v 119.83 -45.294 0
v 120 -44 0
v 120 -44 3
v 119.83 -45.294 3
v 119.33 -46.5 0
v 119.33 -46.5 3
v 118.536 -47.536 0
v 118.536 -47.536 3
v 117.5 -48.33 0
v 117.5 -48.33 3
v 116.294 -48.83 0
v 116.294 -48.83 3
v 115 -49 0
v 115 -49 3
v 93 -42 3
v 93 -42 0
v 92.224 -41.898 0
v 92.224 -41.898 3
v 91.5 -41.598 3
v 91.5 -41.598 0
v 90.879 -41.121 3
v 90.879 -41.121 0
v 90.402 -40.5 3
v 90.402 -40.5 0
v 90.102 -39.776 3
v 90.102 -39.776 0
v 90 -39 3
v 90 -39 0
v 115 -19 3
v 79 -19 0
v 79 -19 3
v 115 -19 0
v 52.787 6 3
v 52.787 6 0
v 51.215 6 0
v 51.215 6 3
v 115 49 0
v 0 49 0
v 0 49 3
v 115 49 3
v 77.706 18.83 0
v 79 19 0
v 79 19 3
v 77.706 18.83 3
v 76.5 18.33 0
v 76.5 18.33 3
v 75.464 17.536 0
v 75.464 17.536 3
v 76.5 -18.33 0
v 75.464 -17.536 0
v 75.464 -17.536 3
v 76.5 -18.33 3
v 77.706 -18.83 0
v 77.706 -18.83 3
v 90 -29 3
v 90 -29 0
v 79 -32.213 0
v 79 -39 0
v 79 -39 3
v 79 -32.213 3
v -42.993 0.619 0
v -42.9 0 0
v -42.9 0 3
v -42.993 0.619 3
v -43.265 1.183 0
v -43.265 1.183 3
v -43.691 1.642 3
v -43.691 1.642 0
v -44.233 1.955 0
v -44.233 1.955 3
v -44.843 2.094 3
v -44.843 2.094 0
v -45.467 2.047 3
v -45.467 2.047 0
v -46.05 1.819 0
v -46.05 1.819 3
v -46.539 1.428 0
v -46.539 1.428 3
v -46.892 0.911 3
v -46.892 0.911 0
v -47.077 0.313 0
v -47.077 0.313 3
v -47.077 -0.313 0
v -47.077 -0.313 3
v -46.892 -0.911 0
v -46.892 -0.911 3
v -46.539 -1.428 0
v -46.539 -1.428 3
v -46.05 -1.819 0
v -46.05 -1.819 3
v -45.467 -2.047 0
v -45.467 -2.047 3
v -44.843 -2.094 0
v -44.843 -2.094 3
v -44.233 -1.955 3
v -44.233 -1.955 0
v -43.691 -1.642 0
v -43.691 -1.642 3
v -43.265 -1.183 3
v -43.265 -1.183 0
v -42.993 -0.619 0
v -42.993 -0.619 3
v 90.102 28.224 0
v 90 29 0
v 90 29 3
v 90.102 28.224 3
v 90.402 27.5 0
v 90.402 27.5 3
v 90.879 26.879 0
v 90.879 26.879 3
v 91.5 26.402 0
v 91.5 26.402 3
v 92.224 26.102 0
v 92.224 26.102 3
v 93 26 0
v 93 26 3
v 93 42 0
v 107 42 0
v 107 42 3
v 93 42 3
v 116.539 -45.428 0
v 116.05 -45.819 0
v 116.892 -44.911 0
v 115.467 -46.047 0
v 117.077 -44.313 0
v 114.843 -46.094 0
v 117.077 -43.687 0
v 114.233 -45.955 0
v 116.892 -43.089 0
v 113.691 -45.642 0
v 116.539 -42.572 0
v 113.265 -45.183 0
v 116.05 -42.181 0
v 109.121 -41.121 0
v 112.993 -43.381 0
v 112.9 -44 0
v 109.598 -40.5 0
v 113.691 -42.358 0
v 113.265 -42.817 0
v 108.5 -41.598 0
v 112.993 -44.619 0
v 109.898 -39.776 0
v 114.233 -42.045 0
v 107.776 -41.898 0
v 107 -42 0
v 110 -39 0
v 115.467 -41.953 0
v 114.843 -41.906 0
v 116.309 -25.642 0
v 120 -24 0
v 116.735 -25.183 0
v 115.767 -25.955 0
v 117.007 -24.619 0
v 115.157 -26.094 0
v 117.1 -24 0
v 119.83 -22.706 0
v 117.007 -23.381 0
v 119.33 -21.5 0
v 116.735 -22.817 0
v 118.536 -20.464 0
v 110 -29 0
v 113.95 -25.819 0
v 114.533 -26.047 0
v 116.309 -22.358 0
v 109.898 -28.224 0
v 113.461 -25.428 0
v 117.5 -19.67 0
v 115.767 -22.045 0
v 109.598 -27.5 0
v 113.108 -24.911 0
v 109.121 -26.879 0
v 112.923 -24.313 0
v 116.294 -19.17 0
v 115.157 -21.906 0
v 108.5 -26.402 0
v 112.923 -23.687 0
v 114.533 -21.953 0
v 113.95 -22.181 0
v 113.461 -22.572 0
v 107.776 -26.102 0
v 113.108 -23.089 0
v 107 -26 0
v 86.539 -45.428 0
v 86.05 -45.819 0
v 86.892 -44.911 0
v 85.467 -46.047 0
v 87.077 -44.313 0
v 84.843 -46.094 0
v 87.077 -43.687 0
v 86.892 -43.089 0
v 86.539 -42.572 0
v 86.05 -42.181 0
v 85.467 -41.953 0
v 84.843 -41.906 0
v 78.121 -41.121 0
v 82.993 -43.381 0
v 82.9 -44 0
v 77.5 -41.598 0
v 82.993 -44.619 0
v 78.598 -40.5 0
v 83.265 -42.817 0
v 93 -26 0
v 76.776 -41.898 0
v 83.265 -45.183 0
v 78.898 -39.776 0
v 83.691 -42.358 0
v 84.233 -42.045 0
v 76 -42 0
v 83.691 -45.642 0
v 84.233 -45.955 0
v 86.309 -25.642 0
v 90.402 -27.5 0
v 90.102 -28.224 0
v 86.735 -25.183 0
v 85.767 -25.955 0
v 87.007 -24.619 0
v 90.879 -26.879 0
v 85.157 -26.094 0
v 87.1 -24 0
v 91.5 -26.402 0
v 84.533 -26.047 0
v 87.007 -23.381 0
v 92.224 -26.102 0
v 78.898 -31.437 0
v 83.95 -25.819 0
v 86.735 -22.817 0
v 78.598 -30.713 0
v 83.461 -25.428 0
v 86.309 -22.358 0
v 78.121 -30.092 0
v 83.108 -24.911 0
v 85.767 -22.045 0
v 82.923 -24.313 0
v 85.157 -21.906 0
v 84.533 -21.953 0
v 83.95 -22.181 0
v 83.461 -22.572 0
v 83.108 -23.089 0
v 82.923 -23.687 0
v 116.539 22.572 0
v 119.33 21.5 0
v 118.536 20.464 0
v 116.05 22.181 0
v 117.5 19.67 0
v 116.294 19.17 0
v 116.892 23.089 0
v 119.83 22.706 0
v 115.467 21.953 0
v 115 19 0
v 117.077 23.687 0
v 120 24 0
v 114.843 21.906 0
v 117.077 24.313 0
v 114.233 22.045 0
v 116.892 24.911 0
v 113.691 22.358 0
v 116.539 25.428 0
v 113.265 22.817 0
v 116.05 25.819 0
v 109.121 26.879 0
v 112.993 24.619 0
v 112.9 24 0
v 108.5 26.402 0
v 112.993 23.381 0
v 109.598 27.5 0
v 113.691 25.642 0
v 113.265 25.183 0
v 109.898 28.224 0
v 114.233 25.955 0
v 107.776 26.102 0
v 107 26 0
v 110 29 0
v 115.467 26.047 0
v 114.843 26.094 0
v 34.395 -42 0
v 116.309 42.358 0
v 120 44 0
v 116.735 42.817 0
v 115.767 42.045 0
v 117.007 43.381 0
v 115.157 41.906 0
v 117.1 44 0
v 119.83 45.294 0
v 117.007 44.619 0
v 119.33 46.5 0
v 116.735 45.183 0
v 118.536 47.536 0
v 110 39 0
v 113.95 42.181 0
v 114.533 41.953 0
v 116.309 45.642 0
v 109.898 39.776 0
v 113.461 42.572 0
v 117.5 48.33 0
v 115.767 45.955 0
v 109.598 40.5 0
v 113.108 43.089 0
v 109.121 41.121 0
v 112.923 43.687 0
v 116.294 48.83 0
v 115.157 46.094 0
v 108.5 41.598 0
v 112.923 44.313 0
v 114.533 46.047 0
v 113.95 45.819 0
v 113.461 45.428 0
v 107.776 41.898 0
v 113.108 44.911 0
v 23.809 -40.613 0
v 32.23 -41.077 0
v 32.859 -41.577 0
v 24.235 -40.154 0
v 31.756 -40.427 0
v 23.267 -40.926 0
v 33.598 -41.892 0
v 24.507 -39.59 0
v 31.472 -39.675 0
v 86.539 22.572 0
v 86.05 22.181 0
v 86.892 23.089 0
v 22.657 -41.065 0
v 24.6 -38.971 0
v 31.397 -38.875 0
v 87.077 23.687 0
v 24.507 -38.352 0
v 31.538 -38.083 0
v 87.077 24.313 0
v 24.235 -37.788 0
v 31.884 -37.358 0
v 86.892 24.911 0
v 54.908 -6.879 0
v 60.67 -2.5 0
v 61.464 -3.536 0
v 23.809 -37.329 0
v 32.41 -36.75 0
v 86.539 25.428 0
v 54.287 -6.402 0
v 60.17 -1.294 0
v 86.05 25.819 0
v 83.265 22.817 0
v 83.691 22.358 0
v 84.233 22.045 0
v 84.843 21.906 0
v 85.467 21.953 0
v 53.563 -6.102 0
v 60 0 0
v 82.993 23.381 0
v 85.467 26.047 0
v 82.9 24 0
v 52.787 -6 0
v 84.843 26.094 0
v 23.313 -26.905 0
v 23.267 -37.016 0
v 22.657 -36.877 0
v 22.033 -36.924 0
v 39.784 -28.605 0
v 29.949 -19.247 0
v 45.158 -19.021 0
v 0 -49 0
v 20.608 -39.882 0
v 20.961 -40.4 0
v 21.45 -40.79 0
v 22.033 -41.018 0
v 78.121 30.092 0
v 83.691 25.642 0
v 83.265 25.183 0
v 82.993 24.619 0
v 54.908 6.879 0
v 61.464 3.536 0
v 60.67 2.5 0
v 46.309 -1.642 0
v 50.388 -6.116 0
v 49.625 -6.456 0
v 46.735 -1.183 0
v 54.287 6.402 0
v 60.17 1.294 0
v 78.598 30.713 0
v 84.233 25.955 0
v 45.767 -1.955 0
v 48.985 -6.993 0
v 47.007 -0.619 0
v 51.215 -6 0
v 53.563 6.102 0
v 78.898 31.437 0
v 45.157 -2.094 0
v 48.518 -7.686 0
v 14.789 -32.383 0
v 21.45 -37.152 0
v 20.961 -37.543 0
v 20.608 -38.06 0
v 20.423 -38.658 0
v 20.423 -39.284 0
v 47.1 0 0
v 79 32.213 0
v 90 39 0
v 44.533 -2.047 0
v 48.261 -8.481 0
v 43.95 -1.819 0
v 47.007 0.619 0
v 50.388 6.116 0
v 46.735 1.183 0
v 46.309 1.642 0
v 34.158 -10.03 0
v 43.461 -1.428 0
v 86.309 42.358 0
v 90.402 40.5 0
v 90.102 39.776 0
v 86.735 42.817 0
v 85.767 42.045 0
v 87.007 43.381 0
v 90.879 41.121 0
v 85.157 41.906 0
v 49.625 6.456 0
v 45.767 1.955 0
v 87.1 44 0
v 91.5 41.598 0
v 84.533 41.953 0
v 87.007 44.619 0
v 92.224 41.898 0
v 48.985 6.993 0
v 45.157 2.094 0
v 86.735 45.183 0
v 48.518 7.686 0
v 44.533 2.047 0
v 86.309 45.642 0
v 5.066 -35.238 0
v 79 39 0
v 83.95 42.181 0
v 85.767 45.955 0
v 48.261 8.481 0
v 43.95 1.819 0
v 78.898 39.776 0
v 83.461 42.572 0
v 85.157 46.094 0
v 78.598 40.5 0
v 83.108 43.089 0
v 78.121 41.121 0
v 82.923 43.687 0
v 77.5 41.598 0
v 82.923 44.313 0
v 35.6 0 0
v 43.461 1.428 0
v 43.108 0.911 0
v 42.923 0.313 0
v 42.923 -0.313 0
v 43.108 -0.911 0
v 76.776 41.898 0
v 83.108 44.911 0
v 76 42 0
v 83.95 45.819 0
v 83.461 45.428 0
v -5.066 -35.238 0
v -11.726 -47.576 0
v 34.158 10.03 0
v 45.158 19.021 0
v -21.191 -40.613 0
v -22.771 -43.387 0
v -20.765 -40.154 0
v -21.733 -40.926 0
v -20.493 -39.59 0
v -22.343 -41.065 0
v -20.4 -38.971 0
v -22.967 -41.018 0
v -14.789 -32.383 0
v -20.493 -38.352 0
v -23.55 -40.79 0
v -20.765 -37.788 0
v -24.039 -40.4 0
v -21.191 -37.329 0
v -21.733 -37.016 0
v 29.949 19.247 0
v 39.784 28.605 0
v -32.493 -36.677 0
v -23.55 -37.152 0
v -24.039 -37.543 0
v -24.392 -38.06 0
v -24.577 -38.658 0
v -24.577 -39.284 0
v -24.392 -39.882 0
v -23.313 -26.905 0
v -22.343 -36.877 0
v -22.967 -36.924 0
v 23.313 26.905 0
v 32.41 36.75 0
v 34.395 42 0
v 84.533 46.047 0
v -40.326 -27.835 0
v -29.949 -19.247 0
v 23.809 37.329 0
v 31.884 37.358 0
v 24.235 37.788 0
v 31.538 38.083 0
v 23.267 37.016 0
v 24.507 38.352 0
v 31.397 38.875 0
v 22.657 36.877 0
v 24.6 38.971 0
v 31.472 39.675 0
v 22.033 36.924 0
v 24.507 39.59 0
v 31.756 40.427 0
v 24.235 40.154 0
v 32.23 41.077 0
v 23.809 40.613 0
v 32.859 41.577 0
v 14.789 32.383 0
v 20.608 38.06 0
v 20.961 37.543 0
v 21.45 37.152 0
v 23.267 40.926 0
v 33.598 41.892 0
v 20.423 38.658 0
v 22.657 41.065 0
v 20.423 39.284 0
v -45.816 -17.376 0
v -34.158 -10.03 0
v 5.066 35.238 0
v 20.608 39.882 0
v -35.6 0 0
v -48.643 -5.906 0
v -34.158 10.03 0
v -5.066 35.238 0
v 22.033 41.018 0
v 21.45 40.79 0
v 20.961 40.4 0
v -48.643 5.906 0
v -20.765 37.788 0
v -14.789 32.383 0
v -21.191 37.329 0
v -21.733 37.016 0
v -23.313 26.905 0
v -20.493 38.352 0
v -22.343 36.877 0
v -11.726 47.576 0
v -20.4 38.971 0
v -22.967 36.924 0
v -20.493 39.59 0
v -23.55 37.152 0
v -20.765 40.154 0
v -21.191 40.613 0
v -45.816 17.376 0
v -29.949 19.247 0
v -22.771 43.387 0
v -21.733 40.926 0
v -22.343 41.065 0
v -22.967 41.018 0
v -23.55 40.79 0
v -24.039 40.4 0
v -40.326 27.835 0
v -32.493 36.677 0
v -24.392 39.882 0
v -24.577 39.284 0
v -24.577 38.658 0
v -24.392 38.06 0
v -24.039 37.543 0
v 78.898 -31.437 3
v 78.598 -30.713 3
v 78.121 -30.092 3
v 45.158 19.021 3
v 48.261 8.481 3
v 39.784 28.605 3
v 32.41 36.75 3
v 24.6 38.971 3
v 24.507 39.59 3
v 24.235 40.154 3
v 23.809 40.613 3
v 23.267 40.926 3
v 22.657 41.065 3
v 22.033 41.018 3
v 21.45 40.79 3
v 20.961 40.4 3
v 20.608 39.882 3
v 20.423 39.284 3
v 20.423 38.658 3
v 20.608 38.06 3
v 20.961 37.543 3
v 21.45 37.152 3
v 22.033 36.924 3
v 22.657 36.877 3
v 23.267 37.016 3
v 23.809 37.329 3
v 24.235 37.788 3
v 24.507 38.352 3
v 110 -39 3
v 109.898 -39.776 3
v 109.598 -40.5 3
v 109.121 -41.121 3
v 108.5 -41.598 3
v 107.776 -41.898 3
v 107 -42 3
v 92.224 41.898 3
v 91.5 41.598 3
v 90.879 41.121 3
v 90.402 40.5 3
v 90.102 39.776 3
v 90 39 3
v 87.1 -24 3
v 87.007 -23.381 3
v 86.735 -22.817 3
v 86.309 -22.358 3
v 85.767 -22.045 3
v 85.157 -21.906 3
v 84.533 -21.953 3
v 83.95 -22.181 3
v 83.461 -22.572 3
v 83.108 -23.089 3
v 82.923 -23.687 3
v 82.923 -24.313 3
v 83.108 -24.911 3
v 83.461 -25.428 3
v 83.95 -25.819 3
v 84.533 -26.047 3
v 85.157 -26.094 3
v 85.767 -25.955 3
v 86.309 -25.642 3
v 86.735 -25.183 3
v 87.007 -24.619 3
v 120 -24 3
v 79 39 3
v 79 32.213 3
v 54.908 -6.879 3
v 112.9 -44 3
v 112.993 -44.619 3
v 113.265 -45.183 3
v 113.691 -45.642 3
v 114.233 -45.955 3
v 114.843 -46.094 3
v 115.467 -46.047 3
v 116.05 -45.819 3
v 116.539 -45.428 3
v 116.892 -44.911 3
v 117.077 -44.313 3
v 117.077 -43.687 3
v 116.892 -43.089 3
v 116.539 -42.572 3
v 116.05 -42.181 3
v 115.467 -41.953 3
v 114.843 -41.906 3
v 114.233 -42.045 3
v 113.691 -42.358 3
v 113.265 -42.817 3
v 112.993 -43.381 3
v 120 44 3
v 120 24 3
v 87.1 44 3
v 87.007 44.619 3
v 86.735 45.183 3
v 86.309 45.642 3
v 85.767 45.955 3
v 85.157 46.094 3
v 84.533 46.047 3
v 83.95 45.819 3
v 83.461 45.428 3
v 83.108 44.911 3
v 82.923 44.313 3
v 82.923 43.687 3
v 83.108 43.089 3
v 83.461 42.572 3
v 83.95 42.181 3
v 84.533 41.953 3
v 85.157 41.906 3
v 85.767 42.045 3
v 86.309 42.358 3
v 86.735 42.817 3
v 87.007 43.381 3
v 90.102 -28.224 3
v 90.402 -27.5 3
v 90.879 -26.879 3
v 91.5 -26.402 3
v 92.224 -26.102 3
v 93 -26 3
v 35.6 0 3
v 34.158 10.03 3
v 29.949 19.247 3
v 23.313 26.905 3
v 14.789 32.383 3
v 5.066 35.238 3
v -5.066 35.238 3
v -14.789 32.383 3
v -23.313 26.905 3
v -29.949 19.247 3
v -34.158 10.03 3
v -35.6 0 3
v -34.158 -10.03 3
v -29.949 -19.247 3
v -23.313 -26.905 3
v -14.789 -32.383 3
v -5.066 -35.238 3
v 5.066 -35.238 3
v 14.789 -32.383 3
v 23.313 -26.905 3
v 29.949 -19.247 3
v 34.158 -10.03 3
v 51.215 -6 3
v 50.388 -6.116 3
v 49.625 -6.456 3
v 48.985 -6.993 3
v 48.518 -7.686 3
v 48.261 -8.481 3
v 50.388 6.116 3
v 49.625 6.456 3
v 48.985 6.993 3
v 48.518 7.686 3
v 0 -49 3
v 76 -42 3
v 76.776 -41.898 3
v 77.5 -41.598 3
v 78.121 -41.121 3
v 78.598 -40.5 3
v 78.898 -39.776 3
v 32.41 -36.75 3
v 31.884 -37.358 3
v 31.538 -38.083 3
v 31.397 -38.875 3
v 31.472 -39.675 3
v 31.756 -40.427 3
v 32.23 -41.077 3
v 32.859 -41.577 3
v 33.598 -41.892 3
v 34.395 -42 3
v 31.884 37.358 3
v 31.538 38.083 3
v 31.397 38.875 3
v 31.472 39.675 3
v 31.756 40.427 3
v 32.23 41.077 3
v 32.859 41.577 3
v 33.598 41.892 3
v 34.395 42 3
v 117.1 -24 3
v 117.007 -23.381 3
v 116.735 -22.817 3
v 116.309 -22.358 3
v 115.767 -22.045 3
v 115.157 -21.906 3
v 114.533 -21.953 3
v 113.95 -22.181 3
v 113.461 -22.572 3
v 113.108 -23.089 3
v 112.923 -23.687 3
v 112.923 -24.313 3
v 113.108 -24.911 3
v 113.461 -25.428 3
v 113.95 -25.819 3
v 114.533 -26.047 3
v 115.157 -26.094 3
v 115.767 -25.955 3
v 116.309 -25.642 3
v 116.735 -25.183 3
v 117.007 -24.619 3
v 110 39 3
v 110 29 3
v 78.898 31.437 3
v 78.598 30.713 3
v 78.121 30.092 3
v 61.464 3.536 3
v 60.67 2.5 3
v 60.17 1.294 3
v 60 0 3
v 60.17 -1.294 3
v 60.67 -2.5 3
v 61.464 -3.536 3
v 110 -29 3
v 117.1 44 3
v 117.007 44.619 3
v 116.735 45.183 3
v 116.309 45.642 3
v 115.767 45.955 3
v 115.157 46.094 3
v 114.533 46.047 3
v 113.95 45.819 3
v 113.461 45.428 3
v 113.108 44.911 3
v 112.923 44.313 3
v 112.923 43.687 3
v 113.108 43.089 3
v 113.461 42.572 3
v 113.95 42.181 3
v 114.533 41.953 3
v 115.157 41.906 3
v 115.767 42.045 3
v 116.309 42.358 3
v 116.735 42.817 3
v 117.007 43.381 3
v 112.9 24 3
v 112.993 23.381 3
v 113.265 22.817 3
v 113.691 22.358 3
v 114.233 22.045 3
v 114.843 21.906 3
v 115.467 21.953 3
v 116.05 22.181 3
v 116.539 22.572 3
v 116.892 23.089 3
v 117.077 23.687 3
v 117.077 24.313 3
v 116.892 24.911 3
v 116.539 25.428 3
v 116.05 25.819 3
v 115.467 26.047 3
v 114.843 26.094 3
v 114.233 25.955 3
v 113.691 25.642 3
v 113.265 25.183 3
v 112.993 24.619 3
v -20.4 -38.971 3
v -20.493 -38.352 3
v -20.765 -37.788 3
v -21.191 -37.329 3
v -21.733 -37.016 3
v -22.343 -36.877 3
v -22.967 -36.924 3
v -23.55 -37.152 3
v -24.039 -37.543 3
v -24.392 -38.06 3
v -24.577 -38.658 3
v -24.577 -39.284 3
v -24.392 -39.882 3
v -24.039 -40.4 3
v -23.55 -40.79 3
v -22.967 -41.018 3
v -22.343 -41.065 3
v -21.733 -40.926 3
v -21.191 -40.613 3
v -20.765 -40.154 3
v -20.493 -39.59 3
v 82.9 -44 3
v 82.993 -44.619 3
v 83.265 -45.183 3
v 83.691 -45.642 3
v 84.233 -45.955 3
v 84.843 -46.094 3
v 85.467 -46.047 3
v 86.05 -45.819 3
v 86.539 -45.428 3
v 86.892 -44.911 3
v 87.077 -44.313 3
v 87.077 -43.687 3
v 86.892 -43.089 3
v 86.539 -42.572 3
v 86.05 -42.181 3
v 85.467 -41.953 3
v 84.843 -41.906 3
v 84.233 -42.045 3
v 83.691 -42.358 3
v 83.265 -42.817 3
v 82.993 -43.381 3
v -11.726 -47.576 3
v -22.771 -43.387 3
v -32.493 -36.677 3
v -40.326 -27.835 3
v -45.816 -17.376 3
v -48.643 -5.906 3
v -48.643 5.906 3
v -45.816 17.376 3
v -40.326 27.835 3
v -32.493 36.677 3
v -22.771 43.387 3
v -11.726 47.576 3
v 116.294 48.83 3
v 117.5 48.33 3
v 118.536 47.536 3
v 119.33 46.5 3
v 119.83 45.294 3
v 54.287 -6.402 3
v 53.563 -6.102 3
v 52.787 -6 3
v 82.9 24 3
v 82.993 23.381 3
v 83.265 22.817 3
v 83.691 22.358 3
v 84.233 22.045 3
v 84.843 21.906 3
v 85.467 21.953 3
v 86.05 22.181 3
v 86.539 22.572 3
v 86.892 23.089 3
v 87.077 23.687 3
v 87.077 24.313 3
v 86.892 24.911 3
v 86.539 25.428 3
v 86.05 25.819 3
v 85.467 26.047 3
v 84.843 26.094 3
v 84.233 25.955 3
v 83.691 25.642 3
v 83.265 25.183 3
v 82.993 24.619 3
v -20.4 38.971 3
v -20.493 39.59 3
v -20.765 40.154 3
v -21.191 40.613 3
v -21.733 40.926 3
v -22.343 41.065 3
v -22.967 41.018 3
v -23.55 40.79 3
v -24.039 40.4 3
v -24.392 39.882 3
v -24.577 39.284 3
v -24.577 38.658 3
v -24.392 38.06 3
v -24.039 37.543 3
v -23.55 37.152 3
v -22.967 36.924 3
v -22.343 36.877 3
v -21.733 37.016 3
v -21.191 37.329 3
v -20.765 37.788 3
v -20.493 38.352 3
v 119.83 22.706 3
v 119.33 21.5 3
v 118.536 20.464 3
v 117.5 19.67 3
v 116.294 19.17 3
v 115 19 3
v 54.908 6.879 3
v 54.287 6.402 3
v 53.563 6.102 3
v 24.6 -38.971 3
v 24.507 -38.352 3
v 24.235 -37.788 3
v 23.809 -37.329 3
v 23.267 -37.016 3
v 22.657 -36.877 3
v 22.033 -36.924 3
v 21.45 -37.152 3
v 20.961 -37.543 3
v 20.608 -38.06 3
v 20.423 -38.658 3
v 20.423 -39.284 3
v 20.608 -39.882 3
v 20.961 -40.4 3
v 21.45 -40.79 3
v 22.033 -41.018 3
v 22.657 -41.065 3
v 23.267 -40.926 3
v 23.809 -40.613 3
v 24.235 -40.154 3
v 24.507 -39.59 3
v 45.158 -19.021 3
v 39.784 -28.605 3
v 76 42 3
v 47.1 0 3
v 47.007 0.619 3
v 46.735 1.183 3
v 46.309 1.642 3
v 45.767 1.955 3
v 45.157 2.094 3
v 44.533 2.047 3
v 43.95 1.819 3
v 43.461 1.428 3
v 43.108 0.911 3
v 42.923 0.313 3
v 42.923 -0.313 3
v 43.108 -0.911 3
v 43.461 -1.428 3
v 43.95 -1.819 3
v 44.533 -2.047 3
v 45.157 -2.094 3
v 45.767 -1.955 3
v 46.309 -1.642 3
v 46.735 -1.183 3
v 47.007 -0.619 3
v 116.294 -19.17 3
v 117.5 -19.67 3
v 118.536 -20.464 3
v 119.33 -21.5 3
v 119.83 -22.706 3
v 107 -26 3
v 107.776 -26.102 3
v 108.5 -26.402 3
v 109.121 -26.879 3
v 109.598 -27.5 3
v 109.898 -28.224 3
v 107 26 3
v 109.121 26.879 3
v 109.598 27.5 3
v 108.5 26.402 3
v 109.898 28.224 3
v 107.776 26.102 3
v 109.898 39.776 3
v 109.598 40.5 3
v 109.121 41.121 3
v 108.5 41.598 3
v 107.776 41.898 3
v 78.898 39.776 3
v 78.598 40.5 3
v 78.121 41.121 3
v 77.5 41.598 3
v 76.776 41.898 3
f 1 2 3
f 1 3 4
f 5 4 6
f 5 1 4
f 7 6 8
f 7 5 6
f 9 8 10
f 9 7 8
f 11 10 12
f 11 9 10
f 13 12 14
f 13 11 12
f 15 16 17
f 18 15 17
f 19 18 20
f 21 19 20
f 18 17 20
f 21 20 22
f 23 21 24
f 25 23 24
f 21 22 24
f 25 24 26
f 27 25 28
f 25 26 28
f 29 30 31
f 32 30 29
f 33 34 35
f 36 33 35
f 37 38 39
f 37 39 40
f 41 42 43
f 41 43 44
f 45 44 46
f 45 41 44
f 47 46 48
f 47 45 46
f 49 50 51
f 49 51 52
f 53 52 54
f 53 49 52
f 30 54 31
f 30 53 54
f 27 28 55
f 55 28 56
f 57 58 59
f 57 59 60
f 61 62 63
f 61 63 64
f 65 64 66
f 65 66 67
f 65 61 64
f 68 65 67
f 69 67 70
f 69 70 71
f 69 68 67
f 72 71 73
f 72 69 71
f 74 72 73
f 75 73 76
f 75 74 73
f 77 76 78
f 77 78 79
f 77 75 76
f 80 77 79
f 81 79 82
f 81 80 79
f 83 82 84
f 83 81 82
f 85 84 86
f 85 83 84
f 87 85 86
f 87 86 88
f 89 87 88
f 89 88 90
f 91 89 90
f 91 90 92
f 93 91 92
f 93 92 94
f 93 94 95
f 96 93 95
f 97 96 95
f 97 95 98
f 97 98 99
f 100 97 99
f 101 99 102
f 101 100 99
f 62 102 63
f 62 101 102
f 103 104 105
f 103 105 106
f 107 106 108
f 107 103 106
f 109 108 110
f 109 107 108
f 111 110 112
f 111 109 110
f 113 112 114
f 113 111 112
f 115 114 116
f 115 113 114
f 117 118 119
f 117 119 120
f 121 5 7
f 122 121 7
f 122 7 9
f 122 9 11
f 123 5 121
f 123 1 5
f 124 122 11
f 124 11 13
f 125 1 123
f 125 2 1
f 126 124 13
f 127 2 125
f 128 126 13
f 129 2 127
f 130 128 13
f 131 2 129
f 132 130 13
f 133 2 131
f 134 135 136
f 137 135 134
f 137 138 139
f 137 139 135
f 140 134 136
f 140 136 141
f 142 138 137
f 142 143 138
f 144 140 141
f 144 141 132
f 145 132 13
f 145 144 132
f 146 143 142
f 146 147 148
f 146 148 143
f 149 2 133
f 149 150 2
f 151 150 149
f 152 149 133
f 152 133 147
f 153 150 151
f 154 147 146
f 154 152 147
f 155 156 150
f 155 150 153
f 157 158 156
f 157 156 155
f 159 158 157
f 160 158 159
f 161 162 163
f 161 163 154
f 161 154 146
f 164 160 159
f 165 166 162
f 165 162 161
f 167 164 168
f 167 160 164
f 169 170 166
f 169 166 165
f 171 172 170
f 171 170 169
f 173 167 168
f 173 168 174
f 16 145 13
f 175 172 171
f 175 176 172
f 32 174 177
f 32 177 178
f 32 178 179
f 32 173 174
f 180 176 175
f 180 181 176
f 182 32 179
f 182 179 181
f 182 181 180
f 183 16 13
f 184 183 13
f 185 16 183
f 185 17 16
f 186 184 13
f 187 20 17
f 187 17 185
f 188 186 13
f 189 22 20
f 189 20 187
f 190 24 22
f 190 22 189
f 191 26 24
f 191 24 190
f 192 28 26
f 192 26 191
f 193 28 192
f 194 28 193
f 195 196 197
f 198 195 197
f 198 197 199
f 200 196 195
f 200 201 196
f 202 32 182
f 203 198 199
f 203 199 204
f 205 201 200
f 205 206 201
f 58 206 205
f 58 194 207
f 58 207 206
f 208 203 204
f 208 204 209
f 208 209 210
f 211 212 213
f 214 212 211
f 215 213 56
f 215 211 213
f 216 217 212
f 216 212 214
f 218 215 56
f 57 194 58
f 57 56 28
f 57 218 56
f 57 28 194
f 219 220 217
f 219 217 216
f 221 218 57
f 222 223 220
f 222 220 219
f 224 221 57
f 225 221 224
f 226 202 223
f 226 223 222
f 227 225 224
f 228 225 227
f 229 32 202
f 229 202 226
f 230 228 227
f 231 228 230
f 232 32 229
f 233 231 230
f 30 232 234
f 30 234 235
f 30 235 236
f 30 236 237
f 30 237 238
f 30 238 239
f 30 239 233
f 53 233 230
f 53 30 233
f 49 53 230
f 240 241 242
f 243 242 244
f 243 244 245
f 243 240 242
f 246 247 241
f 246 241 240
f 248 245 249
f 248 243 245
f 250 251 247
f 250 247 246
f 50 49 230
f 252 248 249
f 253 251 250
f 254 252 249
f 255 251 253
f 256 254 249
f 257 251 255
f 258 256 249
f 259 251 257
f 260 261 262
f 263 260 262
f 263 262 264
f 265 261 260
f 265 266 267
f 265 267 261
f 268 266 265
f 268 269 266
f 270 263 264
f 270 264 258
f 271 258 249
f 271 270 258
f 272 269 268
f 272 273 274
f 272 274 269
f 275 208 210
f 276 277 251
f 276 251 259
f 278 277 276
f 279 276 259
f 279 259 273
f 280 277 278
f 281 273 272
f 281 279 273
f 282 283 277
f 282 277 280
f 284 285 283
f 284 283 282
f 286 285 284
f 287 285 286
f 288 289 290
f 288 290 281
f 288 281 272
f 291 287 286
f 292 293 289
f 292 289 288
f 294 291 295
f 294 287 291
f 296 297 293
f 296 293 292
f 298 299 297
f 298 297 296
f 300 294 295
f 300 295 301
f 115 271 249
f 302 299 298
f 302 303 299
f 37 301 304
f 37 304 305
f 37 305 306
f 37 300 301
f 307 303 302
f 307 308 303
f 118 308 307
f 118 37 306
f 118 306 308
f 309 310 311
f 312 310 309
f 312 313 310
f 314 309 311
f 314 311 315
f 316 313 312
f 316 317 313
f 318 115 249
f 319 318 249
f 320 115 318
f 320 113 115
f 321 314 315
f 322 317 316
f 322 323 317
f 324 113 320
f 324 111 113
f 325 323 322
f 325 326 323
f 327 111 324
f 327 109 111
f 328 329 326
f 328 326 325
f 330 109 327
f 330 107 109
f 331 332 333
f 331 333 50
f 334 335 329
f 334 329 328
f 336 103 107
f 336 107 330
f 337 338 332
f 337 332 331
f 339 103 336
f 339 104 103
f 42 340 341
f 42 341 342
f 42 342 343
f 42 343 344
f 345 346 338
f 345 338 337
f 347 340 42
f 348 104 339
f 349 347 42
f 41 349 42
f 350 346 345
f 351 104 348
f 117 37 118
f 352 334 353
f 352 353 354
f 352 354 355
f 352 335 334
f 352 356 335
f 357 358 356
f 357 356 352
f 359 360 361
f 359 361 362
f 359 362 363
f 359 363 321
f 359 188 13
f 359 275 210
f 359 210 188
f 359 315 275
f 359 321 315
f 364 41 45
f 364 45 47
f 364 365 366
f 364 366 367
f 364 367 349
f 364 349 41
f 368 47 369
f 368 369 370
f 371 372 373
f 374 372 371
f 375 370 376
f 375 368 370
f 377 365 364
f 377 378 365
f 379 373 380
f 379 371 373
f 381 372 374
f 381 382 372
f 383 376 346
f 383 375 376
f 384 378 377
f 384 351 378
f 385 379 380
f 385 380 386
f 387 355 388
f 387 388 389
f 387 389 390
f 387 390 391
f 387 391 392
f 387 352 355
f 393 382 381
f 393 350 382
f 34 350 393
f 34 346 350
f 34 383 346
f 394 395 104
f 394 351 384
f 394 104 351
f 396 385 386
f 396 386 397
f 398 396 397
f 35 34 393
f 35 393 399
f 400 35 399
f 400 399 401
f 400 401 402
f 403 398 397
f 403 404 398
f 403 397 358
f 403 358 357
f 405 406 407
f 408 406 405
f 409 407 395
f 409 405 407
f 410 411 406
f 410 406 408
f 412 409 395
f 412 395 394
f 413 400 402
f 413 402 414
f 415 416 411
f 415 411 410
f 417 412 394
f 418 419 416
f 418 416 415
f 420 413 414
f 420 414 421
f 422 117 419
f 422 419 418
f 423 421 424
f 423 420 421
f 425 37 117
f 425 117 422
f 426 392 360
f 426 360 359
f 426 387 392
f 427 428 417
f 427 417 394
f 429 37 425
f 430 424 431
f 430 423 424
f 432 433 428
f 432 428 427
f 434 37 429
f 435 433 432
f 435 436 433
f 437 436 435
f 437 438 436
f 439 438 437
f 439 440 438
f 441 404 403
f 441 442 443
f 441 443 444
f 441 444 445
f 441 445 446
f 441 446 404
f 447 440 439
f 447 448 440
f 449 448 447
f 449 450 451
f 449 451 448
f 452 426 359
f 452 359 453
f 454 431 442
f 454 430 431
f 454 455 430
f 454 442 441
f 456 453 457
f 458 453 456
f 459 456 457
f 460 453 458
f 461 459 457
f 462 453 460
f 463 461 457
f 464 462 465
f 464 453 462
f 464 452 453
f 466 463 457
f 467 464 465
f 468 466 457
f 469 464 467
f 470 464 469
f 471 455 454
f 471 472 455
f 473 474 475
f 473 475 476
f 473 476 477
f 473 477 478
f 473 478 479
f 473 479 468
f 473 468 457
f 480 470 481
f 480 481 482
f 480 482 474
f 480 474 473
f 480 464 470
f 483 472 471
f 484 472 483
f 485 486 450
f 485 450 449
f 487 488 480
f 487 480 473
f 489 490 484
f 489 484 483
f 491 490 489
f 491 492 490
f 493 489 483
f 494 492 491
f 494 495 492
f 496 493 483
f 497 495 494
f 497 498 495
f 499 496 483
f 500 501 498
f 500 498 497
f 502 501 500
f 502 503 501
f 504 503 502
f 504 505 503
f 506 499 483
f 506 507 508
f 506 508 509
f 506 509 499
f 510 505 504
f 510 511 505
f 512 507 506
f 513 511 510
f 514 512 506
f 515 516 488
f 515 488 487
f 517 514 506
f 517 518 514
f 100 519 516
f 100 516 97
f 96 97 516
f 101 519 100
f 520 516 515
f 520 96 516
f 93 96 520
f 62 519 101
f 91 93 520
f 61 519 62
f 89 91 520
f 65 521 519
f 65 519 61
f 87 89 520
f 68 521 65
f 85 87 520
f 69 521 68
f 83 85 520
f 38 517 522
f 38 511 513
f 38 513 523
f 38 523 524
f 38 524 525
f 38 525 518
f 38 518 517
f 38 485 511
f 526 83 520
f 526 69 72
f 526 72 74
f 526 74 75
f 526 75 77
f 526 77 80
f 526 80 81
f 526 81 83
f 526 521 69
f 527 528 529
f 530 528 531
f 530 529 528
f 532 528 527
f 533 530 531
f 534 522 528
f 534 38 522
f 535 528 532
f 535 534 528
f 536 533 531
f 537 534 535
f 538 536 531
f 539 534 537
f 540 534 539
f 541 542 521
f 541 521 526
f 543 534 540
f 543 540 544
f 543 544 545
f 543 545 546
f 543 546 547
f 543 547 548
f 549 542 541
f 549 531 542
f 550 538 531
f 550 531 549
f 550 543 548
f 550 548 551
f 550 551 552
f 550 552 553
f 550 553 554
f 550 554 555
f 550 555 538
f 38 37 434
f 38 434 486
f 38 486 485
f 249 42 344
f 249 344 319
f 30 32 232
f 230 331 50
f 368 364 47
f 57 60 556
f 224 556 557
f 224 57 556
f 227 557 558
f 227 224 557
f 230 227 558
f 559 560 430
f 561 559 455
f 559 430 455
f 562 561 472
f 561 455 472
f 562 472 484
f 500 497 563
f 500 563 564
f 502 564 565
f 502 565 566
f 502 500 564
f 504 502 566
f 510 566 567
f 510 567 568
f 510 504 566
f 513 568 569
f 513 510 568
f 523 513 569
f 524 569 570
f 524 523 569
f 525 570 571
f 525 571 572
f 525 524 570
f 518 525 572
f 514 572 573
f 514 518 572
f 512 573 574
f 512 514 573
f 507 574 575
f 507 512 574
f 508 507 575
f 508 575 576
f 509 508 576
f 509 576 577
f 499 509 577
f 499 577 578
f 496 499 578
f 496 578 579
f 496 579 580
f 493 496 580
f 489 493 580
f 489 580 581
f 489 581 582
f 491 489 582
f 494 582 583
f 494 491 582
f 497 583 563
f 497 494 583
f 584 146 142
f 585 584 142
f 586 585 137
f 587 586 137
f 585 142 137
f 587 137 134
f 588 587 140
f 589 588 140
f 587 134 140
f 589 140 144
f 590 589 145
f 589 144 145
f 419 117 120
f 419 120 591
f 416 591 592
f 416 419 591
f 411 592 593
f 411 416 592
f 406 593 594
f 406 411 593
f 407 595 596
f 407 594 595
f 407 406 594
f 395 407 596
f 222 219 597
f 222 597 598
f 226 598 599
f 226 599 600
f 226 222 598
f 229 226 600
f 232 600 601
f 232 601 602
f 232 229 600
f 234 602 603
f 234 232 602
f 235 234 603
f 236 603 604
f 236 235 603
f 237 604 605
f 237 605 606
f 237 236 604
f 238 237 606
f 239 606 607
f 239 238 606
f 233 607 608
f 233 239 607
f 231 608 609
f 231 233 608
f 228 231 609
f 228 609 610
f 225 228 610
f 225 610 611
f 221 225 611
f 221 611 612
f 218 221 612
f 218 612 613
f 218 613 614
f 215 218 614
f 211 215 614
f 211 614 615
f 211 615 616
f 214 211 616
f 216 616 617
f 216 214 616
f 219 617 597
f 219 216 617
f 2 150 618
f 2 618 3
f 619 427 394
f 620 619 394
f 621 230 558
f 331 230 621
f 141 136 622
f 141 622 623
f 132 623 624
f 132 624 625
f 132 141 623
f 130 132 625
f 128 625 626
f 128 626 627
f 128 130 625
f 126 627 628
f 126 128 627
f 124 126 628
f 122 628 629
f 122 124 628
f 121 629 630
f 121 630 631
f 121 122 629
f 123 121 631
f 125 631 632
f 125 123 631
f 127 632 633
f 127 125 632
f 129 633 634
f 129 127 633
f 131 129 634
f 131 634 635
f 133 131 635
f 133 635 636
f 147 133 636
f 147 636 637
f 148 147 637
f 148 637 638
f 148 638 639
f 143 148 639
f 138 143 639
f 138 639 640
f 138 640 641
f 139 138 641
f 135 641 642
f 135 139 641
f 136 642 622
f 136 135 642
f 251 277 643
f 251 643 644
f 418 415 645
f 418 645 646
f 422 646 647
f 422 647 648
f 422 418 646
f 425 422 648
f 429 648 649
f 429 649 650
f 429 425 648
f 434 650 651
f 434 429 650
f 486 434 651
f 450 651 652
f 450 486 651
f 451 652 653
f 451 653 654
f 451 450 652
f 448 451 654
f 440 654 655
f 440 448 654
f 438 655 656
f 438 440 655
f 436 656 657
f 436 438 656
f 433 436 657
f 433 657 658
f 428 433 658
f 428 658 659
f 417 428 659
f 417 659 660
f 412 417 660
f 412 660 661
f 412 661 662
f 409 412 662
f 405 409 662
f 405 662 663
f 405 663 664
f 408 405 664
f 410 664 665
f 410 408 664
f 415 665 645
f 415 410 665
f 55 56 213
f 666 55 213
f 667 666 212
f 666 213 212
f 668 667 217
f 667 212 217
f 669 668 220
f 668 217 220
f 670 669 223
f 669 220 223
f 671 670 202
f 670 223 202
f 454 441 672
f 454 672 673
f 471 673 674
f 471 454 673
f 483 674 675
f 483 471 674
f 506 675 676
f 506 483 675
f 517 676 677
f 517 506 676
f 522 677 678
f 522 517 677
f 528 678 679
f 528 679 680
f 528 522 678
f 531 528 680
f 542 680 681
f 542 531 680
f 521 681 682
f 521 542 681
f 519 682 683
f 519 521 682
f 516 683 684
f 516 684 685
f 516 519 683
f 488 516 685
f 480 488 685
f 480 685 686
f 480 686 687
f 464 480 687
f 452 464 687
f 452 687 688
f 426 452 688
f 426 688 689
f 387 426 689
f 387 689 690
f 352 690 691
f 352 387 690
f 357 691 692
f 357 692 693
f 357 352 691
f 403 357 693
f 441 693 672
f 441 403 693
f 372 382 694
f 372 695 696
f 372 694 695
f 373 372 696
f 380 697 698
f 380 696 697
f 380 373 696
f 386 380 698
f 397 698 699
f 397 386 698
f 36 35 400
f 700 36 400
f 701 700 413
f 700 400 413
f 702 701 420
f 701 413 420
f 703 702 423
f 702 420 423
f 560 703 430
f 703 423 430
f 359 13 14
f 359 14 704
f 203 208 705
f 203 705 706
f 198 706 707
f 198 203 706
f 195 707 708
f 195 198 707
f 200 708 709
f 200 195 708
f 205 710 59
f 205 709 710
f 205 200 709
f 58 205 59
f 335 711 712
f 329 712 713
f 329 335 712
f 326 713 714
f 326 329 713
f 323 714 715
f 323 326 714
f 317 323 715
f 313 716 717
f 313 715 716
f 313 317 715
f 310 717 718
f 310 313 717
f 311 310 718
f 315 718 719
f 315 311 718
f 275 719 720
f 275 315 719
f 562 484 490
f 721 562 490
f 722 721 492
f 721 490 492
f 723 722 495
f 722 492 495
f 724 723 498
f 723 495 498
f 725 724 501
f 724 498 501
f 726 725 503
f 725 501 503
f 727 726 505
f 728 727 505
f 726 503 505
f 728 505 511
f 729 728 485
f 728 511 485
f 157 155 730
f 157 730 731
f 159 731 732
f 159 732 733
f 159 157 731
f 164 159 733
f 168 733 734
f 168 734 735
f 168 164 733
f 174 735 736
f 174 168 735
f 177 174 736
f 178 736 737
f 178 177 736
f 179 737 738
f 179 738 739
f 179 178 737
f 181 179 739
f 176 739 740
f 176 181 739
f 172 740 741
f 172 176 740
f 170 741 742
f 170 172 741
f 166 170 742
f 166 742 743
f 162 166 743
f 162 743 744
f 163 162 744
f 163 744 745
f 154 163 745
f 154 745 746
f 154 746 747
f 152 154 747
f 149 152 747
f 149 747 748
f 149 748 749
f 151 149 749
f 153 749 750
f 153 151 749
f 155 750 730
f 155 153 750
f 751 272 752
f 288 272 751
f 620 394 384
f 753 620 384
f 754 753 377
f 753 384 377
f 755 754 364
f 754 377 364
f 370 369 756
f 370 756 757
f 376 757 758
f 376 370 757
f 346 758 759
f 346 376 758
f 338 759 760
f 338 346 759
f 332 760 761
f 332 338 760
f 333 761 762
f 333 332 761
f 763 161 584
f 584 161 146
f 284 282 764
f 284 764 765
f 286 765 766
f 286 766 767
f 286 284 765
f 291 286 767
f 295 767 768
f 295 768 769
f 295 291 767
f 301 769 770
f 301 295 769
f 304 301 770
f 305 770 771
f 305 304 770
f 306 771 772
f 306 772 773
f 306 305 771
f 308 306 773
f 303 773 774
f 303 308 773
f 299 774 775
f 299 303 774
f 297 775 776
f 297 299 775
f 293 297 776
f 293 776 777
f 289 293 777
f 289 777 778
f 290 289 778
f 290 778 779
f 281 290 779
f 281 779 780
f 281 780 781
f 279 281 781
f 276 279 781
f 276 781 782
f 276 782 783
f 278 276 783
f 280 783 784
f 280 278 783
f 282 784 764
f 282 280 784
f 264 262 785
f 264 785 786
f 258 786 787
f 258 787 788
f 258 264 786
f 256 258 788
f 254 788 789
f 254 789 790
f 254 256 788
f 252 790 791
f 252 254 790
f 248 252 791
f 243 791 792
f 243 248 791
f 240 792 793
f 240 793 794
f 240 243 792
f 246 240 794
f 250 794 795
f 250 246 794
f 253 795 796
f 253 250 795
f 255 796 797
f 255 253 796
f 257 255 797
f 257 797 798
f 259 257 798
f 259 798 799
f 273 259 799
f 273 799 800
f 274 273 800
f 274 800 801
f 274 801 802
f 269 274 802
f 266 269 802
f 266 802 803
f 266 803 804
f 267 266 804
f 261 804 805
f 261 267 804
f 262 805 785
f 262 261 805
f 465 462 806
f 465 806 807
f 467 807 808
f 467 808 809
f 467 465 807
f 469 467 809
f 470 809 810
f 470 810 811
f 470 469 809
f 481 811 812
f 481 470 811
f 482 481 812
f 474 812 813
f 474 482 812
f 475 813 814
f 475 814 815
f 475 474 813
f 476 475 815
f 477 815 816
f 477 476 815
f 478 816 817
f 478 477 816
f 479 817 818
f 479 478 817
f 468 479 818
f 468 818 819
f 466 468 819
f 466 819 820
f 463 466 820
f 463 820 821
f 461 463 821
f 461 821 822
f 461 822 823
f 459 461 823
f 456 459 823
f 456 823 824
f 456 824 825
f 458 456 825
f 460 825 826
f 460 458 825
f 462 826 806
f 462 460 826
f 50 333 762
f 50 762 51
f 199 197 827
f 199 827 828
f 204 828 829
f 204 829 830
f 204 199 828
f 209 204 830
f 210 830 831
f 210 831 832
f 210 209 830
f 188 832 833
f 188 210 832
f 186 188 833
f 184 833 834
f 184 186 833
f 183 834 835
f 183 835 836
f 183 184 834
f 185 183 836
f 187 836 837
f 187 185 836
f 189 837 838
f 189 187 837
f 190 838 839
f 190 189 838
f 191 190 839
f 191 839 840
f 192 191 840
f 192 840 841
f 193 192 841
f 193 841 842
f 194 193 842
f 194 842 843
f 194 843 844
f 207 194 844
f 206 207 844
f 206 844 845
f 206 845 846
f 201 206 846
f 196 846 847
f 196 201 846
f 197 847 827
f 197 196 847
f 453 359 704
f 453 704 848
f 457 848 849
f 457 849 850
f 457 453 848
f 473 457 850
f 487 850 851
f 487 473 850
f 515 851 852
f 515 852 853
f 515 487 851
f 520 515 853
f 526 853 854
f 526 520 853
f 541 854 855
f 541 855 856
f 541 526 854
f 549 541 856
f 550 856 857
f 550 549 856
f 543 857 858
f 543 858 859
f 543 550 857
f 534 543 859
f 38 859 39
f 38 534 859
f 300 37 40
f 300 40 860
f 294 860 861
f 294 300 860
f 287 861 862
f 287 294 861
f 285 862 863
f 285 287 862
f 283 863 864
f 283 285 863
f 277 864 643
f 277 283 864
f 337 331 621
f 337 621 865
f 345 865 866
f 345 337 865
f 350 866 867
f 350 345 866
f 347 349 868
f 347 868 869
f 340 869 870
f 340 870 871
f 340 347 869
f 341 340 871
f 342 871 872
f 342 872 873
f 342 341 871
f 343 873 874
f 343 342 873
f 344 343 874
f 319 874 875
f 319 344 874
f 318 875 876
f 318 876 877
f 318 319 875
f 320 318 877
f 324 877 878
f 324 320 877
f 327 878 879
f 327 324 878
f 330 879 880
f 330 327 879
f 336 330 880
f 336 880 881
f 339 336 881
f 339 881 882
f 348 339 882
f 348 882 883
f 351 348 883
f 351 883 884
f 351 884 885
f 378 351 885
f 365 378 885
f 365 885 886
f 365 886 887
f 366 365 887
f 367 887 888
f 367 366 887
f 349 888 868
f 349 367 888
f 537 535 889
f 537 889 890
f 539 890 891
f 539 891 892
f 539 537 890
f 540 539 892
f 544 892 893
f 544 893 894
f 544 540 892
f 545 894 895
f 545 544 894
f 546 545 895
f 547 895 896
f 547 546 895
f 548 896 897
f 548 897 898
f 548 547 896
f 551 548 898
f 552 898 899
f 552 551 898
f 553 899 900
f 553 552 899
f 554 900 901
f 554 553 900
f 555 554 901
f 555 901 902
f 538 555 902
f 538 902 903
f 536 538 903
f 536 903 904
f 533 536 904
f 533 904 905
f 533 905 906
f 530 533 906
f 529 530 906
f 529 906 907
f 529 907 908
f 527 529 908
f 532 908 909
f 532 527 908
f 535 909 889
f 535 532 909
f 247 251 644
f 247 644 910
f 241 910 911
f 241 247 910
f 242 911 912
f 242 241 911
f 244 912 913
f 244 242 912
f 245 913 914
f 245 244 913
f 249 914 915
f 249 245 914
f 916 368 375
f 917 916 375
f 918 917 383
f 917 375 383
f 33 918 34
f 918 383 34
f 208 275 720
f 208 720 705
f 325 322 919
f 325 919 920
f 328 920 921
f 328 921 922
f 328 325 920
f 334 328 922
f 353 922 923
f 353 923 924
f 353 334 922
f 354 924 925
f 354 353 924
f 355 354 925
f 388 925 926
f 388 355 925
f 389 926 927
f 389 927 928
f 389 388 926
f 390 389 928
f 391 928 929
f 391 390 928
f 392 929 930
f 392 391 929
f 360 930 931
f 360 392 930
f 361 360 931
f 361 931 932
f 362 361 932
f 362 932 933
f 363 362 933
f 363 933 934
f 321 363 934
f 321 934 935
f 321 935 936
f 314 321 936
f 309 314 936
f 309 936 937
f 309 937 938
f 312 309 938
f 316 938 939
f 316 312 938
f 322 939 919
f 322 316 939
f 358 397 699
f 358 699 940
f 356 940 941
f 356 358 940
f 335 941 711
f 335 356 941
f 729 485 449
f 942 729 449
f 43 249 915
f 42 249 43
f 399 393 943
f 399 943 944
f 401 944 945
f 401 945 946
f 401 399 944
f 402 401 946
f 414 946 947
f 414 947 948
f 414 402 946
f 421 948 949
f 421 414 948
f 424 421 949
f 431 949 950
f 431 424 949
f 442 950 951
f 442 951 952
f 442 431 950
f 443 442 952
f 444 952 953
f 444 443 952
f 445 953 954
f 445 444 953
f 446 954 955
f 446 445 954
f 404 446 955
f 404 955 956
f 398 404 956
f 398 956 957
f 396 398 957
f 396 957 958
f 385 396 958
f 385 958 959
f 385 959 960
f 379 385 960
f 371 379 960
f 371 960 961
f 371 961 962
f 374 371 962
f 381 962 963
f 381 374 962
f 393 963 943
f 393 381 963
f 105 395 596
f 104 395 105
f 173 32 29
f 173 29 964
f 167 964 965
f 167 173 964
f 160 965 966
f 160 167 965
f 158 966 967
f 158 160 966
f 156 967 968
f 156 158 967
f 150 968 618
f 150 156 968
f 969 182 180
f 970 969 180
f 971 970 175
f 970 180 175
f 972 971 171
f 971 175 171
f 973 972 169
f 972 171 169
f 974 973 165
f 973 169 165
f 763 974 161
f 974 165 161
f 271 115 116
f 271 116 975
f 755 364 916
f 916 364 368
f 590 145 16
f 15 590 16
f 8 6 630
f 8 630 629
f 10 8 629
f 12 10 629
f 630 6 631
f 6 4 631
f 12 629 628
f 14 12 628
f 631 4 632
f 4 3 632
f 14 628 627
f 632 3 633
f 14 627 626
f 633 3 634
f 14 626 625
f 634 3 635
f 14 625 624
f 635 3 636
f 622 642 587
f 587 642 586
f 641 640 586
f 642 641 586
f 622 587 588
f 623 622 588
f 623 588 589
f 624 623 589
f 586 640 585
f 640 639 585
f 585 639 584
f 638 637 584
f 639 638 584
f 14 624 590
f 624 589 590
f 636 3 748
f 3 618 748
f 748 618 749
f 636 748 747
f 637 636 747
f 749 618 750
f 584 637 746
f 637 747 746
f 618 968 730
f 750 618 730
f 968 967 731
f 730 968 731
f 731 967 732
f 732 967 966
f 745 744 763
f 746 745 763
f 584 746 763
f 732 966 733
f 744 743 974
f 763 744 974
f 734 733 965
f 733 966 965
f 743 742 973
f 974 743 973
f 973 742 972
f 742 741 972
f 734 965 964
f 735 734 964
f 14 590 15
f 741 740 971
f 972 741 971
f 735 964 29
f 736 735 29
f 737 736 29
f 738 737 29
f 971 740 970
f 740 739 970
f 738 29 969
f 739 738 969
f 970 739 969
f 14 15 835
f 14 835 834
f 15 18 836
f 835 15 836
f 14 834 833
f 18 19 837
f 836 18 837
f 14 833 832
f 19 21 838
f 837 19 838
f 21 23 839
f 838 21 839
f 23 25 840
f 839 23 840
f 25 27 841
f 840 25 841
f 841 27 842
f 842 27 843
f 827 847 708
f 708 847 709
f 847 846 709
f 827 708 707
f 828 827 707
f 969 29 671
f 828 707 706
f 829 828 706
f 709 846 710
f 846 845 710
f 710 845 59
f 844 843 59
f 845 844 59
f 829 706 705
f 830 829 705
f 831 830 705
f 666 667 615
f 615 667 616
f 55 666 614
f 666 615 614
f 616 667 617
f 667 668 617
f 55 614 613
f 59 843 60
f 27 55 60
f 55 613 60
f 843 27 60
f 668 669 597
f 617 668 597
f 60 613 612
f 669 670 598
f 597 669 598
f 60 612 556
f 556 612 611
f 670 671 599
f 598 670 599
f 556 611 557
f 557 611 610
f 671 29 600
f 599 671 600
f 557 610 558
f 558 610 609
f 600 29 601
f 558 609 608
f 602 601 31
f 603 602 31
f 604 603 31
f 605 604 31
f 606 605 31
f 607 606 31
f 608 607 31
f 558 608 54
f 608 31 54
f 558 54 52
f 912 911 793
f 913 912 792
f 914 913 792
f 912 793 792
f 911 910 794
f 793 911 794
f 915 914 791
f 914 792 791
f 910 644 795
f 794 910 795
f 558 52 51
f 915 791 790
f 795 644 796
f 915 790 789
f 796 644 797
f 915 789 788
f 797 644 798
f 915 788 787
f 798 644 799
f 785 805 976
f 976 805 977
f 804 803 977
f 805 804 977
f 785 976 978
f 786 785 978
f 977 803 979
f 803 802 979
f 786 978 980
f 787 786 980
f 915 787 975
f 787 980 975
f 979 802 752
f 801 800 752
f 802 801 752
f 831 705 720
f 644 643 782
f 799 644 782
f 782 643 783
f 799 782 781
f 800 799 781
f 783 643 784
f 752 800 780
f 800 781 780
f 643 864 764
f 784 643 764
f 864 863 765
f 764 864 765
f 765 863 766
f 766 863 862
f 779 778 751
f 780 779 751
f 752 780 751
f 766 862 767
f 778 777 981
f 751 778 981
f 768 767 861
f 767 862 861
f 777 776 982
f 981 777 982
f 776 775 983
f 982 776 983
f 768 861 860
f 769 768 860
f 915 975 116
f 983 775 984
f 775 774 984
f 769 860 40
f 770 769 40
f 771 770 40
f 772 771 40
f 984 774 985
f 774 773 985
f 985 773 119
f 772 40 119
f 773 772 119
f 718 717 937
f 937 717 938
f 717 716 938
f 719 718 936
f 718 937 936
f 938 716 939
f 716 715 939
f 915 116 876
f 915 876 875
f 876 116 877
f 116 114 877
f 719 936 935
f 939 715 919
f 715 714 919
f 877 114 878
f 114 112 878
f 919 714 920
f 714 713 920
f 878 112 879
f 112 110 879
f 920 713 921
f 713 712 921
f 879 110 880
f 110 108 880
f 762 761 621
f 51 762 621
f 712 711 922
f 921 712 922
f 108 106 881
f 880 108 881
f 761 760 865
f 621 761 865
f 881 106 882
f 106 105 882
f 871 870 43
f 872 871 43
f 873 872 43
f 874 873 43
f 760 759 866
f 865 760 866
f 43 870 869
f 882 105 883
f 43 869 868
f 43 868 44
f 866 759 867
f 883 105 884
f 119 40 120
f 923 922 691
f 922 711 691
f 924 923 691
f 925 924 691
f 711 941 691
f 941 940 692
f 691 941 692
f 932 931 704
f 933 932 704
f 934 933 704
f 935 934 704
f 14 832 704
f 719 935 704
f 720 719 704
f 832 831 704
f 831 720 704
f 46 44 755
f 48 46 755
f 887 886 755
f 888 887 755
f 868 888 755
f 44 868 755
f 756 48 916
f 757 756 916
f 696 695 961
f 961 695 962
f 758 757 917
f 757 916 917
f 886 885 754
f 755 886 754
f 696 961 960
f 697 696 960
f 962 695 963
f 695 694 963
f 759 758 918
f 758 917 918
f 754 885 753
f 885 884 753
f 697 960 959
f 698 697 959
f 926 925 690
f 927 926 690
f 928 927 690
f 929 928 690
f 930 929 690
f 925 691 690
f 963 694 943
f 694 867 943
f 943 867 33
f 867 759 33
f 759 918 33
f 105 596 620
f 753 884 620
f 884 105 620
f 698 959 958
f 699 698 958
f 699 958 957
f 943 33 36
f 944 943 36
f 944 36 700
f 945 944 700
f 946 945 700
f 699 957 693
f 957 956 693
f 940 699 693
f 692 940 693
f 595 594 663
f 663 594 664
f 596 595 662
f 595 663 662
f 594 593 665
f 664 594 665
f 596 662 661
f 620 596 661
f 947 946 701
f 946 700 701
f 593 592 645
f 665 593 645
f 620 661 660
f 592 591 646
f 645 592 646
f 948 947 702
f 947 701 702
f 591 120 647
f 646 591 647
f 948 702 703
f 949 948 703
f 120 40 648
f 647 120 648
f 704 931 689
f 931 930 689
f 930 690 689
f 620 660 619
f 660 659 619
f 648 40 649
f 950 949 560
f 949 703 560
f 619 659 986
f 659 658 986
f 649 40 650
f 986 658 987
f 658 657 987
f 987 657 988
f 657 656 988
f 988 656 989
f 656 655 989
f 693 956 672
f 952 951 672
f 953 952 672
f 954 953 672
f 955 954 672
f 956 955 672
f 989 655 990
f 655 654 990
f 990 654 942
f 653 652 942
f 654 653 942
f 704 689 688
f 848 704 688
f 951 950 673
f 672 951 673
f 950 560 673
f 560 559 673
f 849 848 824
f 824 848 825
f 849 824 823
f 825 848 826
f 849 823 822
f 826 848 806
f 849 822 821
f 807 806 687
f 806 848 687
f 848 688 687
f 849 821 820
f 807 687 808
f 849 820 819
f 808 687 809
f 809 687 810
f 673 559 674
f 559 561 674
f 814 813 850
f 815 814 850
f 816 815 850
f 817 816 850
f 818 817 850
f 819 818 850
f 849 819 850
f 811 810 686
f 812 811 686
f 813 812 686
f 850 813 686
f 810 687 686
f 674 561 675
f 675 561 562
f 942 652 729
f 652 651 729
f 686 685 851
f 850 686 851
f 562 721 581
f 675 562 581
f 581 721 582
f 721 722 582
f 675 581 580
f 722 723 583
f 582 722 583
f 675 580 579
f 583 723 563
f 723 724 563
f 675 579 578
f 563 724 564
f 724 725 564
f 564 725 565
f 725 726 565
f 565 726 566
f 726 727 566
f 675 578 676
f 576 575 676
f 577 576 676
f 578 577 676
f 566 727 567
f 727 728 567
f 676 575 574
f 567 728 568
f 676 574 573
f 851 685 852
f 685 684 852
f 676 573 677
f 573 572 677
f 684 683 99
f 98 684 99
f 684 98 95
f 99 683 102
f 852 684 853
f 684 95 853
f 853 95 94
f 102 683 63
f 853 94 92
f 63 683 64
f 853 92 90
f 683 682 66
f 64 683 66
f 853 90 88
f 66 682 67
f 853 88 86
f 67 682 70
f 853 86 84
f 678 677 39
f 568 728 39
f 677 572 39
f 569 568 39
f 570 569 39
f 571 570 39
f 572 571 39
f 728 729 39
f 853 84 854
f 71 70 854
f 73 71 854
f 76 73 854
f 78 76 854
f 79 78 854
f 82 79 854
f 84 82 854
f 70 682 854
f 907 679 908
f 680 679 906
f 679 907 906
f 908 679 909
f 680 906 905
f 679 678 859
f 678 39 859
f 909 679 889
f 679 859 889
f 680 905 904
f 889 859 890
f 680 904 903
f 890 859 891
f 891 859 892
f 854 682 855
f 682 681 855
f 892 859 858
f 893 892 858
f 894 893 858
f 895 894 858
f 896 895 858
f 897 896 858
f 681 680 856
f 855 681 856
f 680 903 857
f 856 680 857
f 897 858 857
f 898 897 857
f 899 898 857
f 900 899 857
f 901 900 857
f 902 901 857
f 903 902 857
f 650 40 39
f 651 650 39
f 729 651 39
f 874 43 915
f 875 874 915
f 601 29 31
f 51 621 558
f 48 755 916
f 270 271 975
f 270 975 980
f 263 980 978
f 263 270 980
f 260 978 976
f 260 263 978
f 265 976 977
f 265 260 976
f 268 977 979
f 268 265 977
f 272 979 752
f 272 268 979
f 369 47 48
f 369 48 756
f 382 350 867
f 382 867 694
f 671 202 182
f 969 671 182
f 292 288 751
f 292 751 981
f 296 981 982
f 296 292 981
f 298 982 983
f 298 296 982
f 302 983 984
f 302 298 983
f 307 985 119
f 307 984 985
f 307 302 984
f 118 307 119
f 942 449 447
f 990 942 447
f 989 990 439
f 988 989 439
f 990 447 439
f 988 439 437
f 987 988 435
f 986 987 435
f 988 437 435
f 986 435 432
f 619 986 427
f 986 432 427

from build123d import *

# Parameters (mm, degrees)
SKETCH_1_R          = 2.1
SKETCH_1_R_2        = 35.6
EXTRUDE_1_DEPTH     = 3
SKETCH_2_R          = 2.1
CUT_EXTRUDE_1_DEPTH = 3
CUT_EXTRUDE_2_DEPTH = 130.653384067


with BuildPart() as part:
    # 草图1 → 凸台-拉伸1 (new body)
    with BuildSketch(Plane.XY):
        with BuildLine():
            Line((0, 49), (115, 49))
            ThreePointArc((115, 49), (118.535533906, 47.535533906), (120, 44))
            Line((120, 44), (120, 24))
            ThreePointArc((120, 24), (118.535533906, 20.464466094), (115, 19))
            Line((115, 19), (79, 19))
            ThreePointArc((79, 19), (77.086582838, 18.619397663), (75.464466094, 17.535533906))
            Line((75.464466094, 17.535533906), (61.464466094, 3.535533906))
            ThreePointArc((61.464466094, 3.535533906), (60, 0), (61.464466094, -3.535533906))
            Line((61.464466094, -3.535533906), (75.464466094, -17.535533906))
            ThreePointArc((75.464466094, -17.535533906), (77.086582838, -18.619397663), (79, -19))
            Line((79, -19), (115, -19))
            ThreePointArc((115, -19), (118.535533906, -20.464466094), (120, -24))
            Line((120, -24), (120, -44))
            ThreePointArc((120, -44), (118.535533906, -47.535533906), (115, -49))
            Line((115, -49), (0, -49))
            ThreePointArc((0, -49), (-49, 0), (0, 49))
        make_face()
        with Locations((-45, 0)):
            Circle(SKETCH_1_R, mode=Mode.SUBTRACT)
        with Locations((-22.5, 38.97114317)):
            Circle(SKETCH_1_R, mode=Mode.SUBTRACT)
        with Locations((22.5, 38.97114317)):
            Circle(SKETCH_1_R, mode=Mode.SUBTRACT)
        with Locations((45, 0)):
            Circle(SKETCH_1_R, mode=Mode.SUBTRACT)
        with Locations((22.5, -38.97114317)):
            Circle(SKETCH_1_R, mode=Mode.SUBTRACT)
        with Locations((-22.5, -38.97114317)):
            Circle(SKETCH_1_R, mode=Mode.SUBTRACT)
        Circle(SKETCH_1_R_2, mode=Mode.SUBTRACT)
    extrude(amount=EXTRUDE_1_DEPTH)

    # 草图2 → 切除-拉伸1 (cut)
    with BuildSketch(Plane.XY):
        with Locations((85, 44)):
            Circle(SKETCH_2_R)
        with Locations((115, 44)):
            Circle(SKETCH_2_R)
        with Locations(Location((115, 24, 0), (0, 0, 180))):
            Circle(SKETCH_2_R)
        with Locations(Location((85, 24, 0), (0, 0, 180))):
            Circle(SKETCH_2_R)
        with Locations((85, -24)):
            Circle(SKETCH_2_R)
        with Locations((115, -24)):
            Circle(SKETCH_2_R)
        with Locations(Location((115, -44, 0), (0, 0, 180))):
            Circle(SKETCH_2_R)
        with Locations(Location((85, -44, 0), (0, 0, 180))):
            Circle(SKETCH_2_R)
    extrude(amount=CUT_EXTRUDE_1_DEPTH, mode=Mode.SUBTRACT)

    # 草图3 → 切除-拉伸2 (cut, through all)
    with BuildSketch(Plane.XY):
        with BuildLine():
            Line((34.394767044, 42), (76, 42))
            ThreePointArc((76, 42), (78.121320344, 41.121320344), (79, 39))
            Line((79, 39), (79, 32.213203436))
            ThreePointArc((79, 32.213203436), (78.771638598, 31.065153139), (78.121320344, 30.091883092))
            Line((78.121320344, 30.091883092), (54.908116908, 6.878679656))
            ThreePointArc((54.908116908, 6.878679656), (53.934846861, 6.228361402), (52.786796564, 6))
            Line((52.786796564, 6), (51.215232109, 6))
            ThreePointArc((51.215232109, 6), (49.28620286, 6.702426029), (48.26050718, 8.480769231))
            ThreePointArc((48.26050718, 8.480769231), (42.740359483, 23.963757452), (32.410453561, 36.75))
            ThreePointArc((32.410453561, 36.75), (31.588524004, 40.060660172), (34.394767044, 42))
        make_face()
        with BuildLine():
            Line((52.786796564, -6), (51.215232109, -6))
            ThreePointArc((51.215232109, -6), (49.28620286, -6.702426029), (48.26050718, -8.480769231))
            ThreePointArc((48.26050718, -8.480769231), (42.740359483, -23.963757452), (32.410453561, -36.75))
            ThreePointArc((32.410453561, -36.75), (31.588524004, -40.060660172), (34.394767044, -42))
            Line((34.394767044, -42), (76, -42))
            ThreePointArc((76, -42), (78.121320344, -41.121320344), (79, -39))
            Line((79, -39), (79, -32.213203436))
            ThreePointArc((79, -32.213203436), (78.771638598, -31.065153139), (78.121320344, -30.091883092))
            Line((78.121320344, -30.091883092), (54.908116908, -6.878679656))
            ThreePointArc((54.908116908, -6.878679656), (53.934846861, -6.228361402), (52.786796564, -6))
        make_face()
        with BuildLine():
            Line((93, 26), (107, 26))
            ThreePointArc((107, 26), (109.121320344, 26.878679656), (110, 29))
            Line((110, 29), (110, 39))
            ThreePointArc((110, 39), (109.121320344, 41.121320344), (107, 42))
            Line((107, 42), (93, 42))
            ThreePointArc((93, 42), (90.878679656, 41.121320344), (90, 39))
            Line((90, 39), (90, 29))
            ThreePointArc((90, 29), (90.878679656, 26.878679656), (93, 26))
        make_face()
        with BuildLine():
            Line((110, -29), (110, -39))
            ThreePointArc((110, -39), (109.121320344, -41.121320344), (107, -42))
            Line((107, -42), (93, -42))
            ThreePointArc((93, -42), (90.878679656, -41.121320344), (90, -39))
            Line((90, -39), (90, -29))
            ThreePointArc((90, -29), (90.878679656, -26.878679656), (93, -26))
            Line((93, -26), (107, -26))
            ThreePointArc((107, -26), (109.121320344, -26.878679656), (110, -29))
        make_face()
    extrude(amount=CUT_EXTRUDE_2_DEPTH, mode=Mode.SUBTRACT)


solid = part.part
